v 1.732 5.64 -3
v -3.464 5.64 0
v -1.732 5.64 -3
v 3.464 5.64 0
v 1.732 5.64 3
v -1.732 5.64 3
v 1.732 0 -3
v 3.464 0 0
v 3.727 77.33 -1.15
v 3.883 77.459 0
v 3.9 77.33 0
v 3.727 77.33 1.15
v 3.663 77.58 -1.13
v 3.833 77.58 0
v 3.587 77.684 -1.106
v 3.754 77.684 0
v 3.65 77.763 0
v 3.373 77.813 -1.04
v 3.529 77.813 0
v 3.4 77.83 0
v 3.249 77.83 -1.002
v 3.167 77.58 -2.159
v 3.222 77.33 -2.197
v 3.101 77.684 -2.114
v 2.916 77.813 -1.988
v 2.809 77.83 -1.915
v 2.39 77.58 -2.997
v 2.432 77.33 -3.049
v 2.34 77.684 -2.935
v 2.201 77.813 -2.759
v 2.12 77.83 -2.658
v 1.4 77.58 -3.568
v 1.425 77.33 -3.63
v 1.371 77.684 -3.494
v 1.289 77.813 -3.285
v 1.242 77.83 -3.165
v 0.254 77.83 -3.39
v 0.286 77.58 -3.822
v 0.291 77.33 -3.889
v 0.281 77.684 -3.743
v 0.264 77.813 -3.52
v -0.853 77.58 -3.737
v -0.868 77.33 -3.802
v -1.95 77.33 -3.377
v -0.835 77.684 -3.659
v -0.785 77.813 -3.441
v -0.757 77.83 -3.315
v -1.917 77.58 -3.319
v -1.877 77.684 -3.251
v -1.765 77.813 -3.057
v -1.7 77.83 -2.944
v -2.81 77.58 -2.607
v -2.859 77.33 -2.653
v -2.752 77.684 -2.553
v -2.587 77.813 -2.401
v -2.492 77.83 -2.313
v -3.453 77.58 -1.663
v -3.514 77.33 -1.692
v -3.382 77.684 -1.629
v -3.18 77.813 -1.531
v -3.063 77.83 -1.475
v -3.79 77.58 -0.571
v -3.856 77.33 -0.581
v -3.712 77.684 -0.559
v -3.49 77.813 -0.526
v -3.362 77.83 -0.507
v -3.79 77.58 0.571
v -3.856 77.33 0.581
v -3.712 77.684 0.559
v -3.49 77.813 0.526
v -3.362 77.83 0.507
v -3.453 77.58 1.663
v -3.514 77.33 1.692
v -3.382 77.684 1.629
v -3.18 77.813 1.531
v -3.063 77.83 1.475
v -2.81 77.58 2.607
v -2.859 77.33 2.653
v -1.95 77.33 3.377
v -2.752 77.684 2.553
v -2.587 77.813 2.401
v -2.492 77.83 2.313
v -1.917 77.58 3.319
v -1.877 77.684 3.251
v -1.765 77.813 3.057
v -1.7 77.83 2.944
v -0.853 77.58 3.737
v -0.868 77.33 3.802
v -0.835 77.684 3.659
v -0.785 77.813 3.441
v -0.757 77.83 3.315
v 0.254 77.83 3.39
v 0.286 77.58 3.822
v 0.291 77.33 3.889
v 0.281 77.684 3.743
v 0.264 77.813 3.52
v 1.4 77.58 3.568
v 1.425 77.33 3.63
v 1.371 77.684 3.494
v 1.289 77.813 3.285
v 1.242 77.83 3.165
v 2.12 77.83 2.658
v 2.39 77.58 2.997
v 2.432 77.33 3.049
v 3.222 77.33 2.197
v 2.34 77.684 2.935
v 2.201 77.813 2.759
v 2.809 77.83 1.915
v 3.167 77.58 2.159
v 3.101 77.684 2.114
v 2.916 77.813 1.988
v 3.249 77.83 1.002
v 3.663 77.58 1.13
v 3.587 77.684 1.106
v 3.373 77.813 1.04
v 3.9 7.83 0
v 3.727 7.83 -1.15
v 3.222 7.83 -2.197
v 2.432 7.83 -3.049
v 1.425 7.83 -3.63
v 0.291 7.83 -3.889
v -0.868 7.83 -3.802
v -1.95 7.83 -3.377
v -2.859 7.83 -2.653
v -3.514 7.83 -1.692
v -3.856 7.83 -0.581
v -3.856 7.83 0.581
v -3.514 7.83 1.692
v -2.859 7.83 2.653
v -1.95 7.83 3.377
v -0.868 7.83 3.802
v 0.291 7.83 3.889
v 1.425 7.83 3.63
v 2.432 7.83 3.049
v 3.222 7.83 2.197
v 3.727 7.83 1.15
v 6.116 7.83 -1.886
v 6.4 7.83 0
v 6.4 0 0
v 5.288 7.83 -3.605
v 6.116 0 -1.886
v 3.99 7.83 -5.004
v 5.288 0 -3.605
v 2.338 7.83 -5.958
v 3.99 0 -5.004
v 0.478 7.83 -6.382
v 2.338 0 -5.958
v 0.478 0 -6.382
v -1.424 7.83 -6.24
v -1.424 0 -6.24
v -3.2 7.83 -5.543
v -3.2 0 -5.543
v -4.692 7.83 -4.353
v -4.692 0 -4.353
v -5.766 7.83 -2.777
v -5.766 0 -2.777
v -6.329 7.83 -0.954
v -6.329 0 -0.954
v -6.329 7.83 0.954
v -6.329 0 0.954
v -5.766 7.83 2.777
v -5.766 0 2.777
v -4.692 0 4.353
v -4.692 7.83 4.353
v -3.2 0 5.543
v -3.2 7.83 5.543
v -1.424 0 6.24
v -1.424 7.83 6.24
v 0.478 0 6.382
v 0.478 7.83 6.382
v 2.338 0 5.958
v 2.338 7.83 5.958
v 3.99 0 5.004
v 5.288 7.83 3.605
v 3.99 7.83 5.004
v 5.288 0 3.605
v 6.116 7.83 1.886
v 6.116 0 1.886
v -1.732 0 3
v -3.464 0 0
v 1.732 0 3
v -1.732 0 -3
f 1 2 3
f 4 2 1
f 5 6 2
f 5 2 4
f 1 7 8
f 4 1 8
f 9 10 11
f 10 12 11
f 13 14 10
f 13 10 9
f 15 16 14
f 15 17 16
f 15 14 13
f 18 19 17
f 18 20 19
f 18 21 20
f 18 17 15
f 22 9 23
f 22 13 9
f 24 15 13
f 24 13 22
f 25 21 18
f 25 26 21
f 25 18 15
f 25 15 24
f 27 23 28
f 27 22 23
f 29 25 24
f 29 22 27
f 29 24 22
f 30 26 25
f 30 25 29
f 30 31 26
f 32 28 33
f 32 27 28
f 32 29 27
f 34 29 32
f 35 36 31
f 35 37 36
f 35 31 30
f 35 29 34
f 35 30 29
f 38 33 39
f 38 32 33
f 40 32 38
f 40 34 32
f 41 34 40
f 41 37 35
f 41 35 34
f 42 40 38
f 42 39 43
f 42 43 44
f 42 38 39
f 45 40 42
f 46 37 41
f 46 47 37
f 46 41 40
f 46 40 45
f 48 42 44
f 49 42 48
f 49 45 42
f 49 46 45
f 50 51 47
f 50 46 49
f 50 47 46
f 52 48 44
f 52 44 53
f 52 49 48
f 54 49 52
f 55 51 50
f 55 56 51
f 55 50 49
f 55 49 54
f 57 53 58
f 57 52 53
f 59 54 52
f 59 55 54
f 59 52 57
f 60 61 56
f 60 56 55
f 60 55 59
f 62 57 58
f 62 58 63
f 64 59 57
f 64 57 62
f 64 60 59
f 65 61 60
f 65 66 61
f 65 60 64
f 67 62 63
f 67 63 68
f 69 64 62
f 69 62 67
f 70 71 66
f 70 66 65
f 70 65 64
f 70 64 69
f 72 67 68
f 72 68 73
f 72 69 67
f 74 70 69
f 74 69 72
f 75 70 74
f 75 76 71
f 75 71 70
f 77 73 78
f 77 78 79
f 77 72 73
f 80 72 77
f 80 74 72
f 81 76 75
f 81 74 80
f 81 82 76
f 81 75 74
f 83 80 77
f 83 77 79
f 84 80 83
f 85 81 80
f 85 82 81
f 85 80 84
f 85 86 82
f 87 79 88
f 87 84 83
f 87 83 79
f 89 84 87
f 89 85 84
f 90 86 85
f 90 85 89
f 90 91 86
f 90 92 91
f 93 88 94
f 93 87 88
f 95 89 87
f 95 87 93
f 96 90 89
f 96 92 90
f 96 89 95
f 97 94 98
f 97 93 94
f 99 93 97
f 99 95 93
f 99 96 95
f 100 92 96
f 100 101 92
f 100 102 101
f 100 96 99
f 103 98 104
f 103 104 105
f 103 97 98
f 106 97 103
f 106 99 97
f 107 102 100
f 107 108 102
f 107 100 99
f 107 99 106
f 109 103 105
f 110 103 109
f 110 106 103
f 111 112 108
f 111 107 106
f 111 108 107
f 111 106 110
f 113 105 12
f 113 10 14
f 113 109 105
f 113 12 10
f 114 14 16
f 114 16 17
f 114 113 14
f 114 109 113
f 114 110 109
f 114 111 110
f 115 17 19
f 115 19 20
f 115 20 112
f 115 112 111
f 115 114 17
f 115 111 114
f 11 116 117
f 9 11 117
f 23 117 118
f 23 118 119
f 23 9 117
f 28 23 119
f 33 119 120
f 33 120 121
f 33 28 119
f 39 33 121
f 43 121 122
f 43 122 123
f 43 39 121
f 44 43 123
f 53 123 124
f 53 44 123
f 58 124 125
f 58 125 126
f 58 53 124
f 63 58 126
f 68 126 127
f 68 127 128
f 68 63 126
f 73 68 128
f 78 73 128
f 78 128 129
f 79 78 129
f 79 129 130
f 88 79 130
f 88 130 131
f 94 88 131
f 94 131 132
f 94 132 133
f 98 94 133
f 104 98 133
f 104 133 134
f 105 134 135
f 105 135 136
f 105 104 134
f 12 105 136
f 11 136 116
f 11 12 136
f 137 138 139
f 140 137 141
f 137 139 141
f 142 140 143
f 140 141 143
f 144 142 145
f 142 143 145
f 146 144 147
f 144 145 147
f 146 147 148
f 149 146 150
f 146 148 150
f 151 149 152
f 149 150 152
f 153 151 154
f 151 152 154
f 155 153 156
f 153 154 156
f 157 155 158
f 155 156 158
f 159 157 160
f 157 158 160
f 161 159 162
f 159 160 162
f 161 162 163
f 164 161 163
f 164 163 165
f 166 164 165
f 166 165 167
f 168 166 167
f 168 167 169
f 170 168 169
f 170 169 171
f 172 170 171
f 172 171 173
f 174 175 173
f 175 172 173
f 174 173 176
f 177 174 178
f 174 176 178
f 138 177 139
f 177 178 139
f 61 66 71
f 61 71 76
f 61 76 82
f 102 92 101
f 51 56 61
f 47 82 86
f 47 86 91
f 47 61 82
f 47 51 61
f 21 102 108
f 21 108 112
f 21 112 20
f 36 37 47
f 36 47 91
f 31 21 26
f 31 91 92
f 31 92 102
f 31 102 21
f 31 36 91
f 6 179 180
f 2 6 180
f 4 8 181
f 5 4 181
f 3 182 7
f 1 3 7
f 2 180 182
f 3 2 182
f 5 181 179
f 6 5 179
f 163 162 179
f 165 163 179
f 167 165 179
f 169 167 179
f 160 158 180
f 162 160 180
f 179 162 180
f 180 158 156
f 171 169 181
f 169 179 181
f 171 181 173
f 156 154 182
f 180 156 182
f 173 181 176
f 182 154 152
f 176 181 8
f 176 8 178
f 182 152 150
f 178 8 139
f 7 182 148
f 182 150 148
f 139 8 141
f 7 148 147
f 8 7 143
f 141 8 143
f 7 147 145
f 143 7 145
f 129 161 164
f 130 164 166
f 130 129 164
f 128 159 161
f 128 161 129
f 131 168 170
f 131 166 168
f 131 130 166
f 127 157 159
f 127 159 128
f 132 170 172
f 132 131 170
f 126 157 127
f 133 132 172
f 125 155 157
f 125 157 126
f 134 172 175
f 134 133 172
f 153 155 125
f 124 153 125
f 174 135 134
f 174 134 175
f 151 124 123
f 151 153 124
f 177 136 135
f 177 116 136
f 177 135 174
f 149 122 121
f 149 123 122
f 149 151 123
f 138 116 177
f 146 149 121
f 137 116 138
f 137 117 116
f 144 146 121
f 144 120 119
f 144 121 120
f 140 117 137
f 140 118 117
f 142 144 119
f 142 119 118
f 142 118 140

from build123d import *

# Parameters (mm, degrees)
SKETCH1_R           = 6.4
BOSS_EXTRUDE1_DEPTH = 77.83
SKETCH2_OUTSIDE_W   = 30.782
SKETCH2_OUTSIDE_H   = 30.782
SKETCH2_OUTSIDE_R   = 3.9
CUT_EXTRUDE1_DEPTH  = 70
CUT_EXTRUDE2_DEPTH  = 5.64
FILLET1_R           = 0.5


with BuildPart() as part:
    # Sketch1 → Boss-Extrude1 (new body)
    with BuildSketch(Plane(origin=(0, 0, 0), x_dir=(1, 0, 0), z_dir=(0, 1, 0))):
        Circle(SKETCH1_R)
    extrude(amount=BOSS_EXTRUDE1_DEPTH)

    # Sketch2 outside → Cut-Extrude1 (cut)
    with BuildSketch(Plane(origin=(0, 77.83, 0), x_dir=(1, 0, 0), z_dir=(0, 1, 0))):
        Rectangle(SKETCH2_OUTSIDE_W, SKETCH2_OUTSIDE_H)
        Circle(SKETCH2_OUTSIDE_R, mode=Mode.SUBTRACT)
    extrude(amount=-CUT_EXTRUDE1_DEPTH, mode=Mode.SUBTRACT)

    # Sketch8 → Cut-Extrude2 (cut)
    with BuildSketch(Plane.XZ):
        Polygon((3.464101615, 0), (1.732050808, 3), (-1.732050808, 3), (-3.464101615, 0), (-1.732050808, -3), (1.732050808, -3), align=None)
    extrude(amount=-CUT_EXTRUDE2_DEPTH, mode=Mode.SUBTRACT)

    # Fillet1
    fillet1_edges = [part.edges().sort_by_distance(p)[0] for p in [
        (-3.9, 77.83, 0),
    ]]
    fillet(fillet1_edges, radius=FILLET1_R)


solid = part.part
